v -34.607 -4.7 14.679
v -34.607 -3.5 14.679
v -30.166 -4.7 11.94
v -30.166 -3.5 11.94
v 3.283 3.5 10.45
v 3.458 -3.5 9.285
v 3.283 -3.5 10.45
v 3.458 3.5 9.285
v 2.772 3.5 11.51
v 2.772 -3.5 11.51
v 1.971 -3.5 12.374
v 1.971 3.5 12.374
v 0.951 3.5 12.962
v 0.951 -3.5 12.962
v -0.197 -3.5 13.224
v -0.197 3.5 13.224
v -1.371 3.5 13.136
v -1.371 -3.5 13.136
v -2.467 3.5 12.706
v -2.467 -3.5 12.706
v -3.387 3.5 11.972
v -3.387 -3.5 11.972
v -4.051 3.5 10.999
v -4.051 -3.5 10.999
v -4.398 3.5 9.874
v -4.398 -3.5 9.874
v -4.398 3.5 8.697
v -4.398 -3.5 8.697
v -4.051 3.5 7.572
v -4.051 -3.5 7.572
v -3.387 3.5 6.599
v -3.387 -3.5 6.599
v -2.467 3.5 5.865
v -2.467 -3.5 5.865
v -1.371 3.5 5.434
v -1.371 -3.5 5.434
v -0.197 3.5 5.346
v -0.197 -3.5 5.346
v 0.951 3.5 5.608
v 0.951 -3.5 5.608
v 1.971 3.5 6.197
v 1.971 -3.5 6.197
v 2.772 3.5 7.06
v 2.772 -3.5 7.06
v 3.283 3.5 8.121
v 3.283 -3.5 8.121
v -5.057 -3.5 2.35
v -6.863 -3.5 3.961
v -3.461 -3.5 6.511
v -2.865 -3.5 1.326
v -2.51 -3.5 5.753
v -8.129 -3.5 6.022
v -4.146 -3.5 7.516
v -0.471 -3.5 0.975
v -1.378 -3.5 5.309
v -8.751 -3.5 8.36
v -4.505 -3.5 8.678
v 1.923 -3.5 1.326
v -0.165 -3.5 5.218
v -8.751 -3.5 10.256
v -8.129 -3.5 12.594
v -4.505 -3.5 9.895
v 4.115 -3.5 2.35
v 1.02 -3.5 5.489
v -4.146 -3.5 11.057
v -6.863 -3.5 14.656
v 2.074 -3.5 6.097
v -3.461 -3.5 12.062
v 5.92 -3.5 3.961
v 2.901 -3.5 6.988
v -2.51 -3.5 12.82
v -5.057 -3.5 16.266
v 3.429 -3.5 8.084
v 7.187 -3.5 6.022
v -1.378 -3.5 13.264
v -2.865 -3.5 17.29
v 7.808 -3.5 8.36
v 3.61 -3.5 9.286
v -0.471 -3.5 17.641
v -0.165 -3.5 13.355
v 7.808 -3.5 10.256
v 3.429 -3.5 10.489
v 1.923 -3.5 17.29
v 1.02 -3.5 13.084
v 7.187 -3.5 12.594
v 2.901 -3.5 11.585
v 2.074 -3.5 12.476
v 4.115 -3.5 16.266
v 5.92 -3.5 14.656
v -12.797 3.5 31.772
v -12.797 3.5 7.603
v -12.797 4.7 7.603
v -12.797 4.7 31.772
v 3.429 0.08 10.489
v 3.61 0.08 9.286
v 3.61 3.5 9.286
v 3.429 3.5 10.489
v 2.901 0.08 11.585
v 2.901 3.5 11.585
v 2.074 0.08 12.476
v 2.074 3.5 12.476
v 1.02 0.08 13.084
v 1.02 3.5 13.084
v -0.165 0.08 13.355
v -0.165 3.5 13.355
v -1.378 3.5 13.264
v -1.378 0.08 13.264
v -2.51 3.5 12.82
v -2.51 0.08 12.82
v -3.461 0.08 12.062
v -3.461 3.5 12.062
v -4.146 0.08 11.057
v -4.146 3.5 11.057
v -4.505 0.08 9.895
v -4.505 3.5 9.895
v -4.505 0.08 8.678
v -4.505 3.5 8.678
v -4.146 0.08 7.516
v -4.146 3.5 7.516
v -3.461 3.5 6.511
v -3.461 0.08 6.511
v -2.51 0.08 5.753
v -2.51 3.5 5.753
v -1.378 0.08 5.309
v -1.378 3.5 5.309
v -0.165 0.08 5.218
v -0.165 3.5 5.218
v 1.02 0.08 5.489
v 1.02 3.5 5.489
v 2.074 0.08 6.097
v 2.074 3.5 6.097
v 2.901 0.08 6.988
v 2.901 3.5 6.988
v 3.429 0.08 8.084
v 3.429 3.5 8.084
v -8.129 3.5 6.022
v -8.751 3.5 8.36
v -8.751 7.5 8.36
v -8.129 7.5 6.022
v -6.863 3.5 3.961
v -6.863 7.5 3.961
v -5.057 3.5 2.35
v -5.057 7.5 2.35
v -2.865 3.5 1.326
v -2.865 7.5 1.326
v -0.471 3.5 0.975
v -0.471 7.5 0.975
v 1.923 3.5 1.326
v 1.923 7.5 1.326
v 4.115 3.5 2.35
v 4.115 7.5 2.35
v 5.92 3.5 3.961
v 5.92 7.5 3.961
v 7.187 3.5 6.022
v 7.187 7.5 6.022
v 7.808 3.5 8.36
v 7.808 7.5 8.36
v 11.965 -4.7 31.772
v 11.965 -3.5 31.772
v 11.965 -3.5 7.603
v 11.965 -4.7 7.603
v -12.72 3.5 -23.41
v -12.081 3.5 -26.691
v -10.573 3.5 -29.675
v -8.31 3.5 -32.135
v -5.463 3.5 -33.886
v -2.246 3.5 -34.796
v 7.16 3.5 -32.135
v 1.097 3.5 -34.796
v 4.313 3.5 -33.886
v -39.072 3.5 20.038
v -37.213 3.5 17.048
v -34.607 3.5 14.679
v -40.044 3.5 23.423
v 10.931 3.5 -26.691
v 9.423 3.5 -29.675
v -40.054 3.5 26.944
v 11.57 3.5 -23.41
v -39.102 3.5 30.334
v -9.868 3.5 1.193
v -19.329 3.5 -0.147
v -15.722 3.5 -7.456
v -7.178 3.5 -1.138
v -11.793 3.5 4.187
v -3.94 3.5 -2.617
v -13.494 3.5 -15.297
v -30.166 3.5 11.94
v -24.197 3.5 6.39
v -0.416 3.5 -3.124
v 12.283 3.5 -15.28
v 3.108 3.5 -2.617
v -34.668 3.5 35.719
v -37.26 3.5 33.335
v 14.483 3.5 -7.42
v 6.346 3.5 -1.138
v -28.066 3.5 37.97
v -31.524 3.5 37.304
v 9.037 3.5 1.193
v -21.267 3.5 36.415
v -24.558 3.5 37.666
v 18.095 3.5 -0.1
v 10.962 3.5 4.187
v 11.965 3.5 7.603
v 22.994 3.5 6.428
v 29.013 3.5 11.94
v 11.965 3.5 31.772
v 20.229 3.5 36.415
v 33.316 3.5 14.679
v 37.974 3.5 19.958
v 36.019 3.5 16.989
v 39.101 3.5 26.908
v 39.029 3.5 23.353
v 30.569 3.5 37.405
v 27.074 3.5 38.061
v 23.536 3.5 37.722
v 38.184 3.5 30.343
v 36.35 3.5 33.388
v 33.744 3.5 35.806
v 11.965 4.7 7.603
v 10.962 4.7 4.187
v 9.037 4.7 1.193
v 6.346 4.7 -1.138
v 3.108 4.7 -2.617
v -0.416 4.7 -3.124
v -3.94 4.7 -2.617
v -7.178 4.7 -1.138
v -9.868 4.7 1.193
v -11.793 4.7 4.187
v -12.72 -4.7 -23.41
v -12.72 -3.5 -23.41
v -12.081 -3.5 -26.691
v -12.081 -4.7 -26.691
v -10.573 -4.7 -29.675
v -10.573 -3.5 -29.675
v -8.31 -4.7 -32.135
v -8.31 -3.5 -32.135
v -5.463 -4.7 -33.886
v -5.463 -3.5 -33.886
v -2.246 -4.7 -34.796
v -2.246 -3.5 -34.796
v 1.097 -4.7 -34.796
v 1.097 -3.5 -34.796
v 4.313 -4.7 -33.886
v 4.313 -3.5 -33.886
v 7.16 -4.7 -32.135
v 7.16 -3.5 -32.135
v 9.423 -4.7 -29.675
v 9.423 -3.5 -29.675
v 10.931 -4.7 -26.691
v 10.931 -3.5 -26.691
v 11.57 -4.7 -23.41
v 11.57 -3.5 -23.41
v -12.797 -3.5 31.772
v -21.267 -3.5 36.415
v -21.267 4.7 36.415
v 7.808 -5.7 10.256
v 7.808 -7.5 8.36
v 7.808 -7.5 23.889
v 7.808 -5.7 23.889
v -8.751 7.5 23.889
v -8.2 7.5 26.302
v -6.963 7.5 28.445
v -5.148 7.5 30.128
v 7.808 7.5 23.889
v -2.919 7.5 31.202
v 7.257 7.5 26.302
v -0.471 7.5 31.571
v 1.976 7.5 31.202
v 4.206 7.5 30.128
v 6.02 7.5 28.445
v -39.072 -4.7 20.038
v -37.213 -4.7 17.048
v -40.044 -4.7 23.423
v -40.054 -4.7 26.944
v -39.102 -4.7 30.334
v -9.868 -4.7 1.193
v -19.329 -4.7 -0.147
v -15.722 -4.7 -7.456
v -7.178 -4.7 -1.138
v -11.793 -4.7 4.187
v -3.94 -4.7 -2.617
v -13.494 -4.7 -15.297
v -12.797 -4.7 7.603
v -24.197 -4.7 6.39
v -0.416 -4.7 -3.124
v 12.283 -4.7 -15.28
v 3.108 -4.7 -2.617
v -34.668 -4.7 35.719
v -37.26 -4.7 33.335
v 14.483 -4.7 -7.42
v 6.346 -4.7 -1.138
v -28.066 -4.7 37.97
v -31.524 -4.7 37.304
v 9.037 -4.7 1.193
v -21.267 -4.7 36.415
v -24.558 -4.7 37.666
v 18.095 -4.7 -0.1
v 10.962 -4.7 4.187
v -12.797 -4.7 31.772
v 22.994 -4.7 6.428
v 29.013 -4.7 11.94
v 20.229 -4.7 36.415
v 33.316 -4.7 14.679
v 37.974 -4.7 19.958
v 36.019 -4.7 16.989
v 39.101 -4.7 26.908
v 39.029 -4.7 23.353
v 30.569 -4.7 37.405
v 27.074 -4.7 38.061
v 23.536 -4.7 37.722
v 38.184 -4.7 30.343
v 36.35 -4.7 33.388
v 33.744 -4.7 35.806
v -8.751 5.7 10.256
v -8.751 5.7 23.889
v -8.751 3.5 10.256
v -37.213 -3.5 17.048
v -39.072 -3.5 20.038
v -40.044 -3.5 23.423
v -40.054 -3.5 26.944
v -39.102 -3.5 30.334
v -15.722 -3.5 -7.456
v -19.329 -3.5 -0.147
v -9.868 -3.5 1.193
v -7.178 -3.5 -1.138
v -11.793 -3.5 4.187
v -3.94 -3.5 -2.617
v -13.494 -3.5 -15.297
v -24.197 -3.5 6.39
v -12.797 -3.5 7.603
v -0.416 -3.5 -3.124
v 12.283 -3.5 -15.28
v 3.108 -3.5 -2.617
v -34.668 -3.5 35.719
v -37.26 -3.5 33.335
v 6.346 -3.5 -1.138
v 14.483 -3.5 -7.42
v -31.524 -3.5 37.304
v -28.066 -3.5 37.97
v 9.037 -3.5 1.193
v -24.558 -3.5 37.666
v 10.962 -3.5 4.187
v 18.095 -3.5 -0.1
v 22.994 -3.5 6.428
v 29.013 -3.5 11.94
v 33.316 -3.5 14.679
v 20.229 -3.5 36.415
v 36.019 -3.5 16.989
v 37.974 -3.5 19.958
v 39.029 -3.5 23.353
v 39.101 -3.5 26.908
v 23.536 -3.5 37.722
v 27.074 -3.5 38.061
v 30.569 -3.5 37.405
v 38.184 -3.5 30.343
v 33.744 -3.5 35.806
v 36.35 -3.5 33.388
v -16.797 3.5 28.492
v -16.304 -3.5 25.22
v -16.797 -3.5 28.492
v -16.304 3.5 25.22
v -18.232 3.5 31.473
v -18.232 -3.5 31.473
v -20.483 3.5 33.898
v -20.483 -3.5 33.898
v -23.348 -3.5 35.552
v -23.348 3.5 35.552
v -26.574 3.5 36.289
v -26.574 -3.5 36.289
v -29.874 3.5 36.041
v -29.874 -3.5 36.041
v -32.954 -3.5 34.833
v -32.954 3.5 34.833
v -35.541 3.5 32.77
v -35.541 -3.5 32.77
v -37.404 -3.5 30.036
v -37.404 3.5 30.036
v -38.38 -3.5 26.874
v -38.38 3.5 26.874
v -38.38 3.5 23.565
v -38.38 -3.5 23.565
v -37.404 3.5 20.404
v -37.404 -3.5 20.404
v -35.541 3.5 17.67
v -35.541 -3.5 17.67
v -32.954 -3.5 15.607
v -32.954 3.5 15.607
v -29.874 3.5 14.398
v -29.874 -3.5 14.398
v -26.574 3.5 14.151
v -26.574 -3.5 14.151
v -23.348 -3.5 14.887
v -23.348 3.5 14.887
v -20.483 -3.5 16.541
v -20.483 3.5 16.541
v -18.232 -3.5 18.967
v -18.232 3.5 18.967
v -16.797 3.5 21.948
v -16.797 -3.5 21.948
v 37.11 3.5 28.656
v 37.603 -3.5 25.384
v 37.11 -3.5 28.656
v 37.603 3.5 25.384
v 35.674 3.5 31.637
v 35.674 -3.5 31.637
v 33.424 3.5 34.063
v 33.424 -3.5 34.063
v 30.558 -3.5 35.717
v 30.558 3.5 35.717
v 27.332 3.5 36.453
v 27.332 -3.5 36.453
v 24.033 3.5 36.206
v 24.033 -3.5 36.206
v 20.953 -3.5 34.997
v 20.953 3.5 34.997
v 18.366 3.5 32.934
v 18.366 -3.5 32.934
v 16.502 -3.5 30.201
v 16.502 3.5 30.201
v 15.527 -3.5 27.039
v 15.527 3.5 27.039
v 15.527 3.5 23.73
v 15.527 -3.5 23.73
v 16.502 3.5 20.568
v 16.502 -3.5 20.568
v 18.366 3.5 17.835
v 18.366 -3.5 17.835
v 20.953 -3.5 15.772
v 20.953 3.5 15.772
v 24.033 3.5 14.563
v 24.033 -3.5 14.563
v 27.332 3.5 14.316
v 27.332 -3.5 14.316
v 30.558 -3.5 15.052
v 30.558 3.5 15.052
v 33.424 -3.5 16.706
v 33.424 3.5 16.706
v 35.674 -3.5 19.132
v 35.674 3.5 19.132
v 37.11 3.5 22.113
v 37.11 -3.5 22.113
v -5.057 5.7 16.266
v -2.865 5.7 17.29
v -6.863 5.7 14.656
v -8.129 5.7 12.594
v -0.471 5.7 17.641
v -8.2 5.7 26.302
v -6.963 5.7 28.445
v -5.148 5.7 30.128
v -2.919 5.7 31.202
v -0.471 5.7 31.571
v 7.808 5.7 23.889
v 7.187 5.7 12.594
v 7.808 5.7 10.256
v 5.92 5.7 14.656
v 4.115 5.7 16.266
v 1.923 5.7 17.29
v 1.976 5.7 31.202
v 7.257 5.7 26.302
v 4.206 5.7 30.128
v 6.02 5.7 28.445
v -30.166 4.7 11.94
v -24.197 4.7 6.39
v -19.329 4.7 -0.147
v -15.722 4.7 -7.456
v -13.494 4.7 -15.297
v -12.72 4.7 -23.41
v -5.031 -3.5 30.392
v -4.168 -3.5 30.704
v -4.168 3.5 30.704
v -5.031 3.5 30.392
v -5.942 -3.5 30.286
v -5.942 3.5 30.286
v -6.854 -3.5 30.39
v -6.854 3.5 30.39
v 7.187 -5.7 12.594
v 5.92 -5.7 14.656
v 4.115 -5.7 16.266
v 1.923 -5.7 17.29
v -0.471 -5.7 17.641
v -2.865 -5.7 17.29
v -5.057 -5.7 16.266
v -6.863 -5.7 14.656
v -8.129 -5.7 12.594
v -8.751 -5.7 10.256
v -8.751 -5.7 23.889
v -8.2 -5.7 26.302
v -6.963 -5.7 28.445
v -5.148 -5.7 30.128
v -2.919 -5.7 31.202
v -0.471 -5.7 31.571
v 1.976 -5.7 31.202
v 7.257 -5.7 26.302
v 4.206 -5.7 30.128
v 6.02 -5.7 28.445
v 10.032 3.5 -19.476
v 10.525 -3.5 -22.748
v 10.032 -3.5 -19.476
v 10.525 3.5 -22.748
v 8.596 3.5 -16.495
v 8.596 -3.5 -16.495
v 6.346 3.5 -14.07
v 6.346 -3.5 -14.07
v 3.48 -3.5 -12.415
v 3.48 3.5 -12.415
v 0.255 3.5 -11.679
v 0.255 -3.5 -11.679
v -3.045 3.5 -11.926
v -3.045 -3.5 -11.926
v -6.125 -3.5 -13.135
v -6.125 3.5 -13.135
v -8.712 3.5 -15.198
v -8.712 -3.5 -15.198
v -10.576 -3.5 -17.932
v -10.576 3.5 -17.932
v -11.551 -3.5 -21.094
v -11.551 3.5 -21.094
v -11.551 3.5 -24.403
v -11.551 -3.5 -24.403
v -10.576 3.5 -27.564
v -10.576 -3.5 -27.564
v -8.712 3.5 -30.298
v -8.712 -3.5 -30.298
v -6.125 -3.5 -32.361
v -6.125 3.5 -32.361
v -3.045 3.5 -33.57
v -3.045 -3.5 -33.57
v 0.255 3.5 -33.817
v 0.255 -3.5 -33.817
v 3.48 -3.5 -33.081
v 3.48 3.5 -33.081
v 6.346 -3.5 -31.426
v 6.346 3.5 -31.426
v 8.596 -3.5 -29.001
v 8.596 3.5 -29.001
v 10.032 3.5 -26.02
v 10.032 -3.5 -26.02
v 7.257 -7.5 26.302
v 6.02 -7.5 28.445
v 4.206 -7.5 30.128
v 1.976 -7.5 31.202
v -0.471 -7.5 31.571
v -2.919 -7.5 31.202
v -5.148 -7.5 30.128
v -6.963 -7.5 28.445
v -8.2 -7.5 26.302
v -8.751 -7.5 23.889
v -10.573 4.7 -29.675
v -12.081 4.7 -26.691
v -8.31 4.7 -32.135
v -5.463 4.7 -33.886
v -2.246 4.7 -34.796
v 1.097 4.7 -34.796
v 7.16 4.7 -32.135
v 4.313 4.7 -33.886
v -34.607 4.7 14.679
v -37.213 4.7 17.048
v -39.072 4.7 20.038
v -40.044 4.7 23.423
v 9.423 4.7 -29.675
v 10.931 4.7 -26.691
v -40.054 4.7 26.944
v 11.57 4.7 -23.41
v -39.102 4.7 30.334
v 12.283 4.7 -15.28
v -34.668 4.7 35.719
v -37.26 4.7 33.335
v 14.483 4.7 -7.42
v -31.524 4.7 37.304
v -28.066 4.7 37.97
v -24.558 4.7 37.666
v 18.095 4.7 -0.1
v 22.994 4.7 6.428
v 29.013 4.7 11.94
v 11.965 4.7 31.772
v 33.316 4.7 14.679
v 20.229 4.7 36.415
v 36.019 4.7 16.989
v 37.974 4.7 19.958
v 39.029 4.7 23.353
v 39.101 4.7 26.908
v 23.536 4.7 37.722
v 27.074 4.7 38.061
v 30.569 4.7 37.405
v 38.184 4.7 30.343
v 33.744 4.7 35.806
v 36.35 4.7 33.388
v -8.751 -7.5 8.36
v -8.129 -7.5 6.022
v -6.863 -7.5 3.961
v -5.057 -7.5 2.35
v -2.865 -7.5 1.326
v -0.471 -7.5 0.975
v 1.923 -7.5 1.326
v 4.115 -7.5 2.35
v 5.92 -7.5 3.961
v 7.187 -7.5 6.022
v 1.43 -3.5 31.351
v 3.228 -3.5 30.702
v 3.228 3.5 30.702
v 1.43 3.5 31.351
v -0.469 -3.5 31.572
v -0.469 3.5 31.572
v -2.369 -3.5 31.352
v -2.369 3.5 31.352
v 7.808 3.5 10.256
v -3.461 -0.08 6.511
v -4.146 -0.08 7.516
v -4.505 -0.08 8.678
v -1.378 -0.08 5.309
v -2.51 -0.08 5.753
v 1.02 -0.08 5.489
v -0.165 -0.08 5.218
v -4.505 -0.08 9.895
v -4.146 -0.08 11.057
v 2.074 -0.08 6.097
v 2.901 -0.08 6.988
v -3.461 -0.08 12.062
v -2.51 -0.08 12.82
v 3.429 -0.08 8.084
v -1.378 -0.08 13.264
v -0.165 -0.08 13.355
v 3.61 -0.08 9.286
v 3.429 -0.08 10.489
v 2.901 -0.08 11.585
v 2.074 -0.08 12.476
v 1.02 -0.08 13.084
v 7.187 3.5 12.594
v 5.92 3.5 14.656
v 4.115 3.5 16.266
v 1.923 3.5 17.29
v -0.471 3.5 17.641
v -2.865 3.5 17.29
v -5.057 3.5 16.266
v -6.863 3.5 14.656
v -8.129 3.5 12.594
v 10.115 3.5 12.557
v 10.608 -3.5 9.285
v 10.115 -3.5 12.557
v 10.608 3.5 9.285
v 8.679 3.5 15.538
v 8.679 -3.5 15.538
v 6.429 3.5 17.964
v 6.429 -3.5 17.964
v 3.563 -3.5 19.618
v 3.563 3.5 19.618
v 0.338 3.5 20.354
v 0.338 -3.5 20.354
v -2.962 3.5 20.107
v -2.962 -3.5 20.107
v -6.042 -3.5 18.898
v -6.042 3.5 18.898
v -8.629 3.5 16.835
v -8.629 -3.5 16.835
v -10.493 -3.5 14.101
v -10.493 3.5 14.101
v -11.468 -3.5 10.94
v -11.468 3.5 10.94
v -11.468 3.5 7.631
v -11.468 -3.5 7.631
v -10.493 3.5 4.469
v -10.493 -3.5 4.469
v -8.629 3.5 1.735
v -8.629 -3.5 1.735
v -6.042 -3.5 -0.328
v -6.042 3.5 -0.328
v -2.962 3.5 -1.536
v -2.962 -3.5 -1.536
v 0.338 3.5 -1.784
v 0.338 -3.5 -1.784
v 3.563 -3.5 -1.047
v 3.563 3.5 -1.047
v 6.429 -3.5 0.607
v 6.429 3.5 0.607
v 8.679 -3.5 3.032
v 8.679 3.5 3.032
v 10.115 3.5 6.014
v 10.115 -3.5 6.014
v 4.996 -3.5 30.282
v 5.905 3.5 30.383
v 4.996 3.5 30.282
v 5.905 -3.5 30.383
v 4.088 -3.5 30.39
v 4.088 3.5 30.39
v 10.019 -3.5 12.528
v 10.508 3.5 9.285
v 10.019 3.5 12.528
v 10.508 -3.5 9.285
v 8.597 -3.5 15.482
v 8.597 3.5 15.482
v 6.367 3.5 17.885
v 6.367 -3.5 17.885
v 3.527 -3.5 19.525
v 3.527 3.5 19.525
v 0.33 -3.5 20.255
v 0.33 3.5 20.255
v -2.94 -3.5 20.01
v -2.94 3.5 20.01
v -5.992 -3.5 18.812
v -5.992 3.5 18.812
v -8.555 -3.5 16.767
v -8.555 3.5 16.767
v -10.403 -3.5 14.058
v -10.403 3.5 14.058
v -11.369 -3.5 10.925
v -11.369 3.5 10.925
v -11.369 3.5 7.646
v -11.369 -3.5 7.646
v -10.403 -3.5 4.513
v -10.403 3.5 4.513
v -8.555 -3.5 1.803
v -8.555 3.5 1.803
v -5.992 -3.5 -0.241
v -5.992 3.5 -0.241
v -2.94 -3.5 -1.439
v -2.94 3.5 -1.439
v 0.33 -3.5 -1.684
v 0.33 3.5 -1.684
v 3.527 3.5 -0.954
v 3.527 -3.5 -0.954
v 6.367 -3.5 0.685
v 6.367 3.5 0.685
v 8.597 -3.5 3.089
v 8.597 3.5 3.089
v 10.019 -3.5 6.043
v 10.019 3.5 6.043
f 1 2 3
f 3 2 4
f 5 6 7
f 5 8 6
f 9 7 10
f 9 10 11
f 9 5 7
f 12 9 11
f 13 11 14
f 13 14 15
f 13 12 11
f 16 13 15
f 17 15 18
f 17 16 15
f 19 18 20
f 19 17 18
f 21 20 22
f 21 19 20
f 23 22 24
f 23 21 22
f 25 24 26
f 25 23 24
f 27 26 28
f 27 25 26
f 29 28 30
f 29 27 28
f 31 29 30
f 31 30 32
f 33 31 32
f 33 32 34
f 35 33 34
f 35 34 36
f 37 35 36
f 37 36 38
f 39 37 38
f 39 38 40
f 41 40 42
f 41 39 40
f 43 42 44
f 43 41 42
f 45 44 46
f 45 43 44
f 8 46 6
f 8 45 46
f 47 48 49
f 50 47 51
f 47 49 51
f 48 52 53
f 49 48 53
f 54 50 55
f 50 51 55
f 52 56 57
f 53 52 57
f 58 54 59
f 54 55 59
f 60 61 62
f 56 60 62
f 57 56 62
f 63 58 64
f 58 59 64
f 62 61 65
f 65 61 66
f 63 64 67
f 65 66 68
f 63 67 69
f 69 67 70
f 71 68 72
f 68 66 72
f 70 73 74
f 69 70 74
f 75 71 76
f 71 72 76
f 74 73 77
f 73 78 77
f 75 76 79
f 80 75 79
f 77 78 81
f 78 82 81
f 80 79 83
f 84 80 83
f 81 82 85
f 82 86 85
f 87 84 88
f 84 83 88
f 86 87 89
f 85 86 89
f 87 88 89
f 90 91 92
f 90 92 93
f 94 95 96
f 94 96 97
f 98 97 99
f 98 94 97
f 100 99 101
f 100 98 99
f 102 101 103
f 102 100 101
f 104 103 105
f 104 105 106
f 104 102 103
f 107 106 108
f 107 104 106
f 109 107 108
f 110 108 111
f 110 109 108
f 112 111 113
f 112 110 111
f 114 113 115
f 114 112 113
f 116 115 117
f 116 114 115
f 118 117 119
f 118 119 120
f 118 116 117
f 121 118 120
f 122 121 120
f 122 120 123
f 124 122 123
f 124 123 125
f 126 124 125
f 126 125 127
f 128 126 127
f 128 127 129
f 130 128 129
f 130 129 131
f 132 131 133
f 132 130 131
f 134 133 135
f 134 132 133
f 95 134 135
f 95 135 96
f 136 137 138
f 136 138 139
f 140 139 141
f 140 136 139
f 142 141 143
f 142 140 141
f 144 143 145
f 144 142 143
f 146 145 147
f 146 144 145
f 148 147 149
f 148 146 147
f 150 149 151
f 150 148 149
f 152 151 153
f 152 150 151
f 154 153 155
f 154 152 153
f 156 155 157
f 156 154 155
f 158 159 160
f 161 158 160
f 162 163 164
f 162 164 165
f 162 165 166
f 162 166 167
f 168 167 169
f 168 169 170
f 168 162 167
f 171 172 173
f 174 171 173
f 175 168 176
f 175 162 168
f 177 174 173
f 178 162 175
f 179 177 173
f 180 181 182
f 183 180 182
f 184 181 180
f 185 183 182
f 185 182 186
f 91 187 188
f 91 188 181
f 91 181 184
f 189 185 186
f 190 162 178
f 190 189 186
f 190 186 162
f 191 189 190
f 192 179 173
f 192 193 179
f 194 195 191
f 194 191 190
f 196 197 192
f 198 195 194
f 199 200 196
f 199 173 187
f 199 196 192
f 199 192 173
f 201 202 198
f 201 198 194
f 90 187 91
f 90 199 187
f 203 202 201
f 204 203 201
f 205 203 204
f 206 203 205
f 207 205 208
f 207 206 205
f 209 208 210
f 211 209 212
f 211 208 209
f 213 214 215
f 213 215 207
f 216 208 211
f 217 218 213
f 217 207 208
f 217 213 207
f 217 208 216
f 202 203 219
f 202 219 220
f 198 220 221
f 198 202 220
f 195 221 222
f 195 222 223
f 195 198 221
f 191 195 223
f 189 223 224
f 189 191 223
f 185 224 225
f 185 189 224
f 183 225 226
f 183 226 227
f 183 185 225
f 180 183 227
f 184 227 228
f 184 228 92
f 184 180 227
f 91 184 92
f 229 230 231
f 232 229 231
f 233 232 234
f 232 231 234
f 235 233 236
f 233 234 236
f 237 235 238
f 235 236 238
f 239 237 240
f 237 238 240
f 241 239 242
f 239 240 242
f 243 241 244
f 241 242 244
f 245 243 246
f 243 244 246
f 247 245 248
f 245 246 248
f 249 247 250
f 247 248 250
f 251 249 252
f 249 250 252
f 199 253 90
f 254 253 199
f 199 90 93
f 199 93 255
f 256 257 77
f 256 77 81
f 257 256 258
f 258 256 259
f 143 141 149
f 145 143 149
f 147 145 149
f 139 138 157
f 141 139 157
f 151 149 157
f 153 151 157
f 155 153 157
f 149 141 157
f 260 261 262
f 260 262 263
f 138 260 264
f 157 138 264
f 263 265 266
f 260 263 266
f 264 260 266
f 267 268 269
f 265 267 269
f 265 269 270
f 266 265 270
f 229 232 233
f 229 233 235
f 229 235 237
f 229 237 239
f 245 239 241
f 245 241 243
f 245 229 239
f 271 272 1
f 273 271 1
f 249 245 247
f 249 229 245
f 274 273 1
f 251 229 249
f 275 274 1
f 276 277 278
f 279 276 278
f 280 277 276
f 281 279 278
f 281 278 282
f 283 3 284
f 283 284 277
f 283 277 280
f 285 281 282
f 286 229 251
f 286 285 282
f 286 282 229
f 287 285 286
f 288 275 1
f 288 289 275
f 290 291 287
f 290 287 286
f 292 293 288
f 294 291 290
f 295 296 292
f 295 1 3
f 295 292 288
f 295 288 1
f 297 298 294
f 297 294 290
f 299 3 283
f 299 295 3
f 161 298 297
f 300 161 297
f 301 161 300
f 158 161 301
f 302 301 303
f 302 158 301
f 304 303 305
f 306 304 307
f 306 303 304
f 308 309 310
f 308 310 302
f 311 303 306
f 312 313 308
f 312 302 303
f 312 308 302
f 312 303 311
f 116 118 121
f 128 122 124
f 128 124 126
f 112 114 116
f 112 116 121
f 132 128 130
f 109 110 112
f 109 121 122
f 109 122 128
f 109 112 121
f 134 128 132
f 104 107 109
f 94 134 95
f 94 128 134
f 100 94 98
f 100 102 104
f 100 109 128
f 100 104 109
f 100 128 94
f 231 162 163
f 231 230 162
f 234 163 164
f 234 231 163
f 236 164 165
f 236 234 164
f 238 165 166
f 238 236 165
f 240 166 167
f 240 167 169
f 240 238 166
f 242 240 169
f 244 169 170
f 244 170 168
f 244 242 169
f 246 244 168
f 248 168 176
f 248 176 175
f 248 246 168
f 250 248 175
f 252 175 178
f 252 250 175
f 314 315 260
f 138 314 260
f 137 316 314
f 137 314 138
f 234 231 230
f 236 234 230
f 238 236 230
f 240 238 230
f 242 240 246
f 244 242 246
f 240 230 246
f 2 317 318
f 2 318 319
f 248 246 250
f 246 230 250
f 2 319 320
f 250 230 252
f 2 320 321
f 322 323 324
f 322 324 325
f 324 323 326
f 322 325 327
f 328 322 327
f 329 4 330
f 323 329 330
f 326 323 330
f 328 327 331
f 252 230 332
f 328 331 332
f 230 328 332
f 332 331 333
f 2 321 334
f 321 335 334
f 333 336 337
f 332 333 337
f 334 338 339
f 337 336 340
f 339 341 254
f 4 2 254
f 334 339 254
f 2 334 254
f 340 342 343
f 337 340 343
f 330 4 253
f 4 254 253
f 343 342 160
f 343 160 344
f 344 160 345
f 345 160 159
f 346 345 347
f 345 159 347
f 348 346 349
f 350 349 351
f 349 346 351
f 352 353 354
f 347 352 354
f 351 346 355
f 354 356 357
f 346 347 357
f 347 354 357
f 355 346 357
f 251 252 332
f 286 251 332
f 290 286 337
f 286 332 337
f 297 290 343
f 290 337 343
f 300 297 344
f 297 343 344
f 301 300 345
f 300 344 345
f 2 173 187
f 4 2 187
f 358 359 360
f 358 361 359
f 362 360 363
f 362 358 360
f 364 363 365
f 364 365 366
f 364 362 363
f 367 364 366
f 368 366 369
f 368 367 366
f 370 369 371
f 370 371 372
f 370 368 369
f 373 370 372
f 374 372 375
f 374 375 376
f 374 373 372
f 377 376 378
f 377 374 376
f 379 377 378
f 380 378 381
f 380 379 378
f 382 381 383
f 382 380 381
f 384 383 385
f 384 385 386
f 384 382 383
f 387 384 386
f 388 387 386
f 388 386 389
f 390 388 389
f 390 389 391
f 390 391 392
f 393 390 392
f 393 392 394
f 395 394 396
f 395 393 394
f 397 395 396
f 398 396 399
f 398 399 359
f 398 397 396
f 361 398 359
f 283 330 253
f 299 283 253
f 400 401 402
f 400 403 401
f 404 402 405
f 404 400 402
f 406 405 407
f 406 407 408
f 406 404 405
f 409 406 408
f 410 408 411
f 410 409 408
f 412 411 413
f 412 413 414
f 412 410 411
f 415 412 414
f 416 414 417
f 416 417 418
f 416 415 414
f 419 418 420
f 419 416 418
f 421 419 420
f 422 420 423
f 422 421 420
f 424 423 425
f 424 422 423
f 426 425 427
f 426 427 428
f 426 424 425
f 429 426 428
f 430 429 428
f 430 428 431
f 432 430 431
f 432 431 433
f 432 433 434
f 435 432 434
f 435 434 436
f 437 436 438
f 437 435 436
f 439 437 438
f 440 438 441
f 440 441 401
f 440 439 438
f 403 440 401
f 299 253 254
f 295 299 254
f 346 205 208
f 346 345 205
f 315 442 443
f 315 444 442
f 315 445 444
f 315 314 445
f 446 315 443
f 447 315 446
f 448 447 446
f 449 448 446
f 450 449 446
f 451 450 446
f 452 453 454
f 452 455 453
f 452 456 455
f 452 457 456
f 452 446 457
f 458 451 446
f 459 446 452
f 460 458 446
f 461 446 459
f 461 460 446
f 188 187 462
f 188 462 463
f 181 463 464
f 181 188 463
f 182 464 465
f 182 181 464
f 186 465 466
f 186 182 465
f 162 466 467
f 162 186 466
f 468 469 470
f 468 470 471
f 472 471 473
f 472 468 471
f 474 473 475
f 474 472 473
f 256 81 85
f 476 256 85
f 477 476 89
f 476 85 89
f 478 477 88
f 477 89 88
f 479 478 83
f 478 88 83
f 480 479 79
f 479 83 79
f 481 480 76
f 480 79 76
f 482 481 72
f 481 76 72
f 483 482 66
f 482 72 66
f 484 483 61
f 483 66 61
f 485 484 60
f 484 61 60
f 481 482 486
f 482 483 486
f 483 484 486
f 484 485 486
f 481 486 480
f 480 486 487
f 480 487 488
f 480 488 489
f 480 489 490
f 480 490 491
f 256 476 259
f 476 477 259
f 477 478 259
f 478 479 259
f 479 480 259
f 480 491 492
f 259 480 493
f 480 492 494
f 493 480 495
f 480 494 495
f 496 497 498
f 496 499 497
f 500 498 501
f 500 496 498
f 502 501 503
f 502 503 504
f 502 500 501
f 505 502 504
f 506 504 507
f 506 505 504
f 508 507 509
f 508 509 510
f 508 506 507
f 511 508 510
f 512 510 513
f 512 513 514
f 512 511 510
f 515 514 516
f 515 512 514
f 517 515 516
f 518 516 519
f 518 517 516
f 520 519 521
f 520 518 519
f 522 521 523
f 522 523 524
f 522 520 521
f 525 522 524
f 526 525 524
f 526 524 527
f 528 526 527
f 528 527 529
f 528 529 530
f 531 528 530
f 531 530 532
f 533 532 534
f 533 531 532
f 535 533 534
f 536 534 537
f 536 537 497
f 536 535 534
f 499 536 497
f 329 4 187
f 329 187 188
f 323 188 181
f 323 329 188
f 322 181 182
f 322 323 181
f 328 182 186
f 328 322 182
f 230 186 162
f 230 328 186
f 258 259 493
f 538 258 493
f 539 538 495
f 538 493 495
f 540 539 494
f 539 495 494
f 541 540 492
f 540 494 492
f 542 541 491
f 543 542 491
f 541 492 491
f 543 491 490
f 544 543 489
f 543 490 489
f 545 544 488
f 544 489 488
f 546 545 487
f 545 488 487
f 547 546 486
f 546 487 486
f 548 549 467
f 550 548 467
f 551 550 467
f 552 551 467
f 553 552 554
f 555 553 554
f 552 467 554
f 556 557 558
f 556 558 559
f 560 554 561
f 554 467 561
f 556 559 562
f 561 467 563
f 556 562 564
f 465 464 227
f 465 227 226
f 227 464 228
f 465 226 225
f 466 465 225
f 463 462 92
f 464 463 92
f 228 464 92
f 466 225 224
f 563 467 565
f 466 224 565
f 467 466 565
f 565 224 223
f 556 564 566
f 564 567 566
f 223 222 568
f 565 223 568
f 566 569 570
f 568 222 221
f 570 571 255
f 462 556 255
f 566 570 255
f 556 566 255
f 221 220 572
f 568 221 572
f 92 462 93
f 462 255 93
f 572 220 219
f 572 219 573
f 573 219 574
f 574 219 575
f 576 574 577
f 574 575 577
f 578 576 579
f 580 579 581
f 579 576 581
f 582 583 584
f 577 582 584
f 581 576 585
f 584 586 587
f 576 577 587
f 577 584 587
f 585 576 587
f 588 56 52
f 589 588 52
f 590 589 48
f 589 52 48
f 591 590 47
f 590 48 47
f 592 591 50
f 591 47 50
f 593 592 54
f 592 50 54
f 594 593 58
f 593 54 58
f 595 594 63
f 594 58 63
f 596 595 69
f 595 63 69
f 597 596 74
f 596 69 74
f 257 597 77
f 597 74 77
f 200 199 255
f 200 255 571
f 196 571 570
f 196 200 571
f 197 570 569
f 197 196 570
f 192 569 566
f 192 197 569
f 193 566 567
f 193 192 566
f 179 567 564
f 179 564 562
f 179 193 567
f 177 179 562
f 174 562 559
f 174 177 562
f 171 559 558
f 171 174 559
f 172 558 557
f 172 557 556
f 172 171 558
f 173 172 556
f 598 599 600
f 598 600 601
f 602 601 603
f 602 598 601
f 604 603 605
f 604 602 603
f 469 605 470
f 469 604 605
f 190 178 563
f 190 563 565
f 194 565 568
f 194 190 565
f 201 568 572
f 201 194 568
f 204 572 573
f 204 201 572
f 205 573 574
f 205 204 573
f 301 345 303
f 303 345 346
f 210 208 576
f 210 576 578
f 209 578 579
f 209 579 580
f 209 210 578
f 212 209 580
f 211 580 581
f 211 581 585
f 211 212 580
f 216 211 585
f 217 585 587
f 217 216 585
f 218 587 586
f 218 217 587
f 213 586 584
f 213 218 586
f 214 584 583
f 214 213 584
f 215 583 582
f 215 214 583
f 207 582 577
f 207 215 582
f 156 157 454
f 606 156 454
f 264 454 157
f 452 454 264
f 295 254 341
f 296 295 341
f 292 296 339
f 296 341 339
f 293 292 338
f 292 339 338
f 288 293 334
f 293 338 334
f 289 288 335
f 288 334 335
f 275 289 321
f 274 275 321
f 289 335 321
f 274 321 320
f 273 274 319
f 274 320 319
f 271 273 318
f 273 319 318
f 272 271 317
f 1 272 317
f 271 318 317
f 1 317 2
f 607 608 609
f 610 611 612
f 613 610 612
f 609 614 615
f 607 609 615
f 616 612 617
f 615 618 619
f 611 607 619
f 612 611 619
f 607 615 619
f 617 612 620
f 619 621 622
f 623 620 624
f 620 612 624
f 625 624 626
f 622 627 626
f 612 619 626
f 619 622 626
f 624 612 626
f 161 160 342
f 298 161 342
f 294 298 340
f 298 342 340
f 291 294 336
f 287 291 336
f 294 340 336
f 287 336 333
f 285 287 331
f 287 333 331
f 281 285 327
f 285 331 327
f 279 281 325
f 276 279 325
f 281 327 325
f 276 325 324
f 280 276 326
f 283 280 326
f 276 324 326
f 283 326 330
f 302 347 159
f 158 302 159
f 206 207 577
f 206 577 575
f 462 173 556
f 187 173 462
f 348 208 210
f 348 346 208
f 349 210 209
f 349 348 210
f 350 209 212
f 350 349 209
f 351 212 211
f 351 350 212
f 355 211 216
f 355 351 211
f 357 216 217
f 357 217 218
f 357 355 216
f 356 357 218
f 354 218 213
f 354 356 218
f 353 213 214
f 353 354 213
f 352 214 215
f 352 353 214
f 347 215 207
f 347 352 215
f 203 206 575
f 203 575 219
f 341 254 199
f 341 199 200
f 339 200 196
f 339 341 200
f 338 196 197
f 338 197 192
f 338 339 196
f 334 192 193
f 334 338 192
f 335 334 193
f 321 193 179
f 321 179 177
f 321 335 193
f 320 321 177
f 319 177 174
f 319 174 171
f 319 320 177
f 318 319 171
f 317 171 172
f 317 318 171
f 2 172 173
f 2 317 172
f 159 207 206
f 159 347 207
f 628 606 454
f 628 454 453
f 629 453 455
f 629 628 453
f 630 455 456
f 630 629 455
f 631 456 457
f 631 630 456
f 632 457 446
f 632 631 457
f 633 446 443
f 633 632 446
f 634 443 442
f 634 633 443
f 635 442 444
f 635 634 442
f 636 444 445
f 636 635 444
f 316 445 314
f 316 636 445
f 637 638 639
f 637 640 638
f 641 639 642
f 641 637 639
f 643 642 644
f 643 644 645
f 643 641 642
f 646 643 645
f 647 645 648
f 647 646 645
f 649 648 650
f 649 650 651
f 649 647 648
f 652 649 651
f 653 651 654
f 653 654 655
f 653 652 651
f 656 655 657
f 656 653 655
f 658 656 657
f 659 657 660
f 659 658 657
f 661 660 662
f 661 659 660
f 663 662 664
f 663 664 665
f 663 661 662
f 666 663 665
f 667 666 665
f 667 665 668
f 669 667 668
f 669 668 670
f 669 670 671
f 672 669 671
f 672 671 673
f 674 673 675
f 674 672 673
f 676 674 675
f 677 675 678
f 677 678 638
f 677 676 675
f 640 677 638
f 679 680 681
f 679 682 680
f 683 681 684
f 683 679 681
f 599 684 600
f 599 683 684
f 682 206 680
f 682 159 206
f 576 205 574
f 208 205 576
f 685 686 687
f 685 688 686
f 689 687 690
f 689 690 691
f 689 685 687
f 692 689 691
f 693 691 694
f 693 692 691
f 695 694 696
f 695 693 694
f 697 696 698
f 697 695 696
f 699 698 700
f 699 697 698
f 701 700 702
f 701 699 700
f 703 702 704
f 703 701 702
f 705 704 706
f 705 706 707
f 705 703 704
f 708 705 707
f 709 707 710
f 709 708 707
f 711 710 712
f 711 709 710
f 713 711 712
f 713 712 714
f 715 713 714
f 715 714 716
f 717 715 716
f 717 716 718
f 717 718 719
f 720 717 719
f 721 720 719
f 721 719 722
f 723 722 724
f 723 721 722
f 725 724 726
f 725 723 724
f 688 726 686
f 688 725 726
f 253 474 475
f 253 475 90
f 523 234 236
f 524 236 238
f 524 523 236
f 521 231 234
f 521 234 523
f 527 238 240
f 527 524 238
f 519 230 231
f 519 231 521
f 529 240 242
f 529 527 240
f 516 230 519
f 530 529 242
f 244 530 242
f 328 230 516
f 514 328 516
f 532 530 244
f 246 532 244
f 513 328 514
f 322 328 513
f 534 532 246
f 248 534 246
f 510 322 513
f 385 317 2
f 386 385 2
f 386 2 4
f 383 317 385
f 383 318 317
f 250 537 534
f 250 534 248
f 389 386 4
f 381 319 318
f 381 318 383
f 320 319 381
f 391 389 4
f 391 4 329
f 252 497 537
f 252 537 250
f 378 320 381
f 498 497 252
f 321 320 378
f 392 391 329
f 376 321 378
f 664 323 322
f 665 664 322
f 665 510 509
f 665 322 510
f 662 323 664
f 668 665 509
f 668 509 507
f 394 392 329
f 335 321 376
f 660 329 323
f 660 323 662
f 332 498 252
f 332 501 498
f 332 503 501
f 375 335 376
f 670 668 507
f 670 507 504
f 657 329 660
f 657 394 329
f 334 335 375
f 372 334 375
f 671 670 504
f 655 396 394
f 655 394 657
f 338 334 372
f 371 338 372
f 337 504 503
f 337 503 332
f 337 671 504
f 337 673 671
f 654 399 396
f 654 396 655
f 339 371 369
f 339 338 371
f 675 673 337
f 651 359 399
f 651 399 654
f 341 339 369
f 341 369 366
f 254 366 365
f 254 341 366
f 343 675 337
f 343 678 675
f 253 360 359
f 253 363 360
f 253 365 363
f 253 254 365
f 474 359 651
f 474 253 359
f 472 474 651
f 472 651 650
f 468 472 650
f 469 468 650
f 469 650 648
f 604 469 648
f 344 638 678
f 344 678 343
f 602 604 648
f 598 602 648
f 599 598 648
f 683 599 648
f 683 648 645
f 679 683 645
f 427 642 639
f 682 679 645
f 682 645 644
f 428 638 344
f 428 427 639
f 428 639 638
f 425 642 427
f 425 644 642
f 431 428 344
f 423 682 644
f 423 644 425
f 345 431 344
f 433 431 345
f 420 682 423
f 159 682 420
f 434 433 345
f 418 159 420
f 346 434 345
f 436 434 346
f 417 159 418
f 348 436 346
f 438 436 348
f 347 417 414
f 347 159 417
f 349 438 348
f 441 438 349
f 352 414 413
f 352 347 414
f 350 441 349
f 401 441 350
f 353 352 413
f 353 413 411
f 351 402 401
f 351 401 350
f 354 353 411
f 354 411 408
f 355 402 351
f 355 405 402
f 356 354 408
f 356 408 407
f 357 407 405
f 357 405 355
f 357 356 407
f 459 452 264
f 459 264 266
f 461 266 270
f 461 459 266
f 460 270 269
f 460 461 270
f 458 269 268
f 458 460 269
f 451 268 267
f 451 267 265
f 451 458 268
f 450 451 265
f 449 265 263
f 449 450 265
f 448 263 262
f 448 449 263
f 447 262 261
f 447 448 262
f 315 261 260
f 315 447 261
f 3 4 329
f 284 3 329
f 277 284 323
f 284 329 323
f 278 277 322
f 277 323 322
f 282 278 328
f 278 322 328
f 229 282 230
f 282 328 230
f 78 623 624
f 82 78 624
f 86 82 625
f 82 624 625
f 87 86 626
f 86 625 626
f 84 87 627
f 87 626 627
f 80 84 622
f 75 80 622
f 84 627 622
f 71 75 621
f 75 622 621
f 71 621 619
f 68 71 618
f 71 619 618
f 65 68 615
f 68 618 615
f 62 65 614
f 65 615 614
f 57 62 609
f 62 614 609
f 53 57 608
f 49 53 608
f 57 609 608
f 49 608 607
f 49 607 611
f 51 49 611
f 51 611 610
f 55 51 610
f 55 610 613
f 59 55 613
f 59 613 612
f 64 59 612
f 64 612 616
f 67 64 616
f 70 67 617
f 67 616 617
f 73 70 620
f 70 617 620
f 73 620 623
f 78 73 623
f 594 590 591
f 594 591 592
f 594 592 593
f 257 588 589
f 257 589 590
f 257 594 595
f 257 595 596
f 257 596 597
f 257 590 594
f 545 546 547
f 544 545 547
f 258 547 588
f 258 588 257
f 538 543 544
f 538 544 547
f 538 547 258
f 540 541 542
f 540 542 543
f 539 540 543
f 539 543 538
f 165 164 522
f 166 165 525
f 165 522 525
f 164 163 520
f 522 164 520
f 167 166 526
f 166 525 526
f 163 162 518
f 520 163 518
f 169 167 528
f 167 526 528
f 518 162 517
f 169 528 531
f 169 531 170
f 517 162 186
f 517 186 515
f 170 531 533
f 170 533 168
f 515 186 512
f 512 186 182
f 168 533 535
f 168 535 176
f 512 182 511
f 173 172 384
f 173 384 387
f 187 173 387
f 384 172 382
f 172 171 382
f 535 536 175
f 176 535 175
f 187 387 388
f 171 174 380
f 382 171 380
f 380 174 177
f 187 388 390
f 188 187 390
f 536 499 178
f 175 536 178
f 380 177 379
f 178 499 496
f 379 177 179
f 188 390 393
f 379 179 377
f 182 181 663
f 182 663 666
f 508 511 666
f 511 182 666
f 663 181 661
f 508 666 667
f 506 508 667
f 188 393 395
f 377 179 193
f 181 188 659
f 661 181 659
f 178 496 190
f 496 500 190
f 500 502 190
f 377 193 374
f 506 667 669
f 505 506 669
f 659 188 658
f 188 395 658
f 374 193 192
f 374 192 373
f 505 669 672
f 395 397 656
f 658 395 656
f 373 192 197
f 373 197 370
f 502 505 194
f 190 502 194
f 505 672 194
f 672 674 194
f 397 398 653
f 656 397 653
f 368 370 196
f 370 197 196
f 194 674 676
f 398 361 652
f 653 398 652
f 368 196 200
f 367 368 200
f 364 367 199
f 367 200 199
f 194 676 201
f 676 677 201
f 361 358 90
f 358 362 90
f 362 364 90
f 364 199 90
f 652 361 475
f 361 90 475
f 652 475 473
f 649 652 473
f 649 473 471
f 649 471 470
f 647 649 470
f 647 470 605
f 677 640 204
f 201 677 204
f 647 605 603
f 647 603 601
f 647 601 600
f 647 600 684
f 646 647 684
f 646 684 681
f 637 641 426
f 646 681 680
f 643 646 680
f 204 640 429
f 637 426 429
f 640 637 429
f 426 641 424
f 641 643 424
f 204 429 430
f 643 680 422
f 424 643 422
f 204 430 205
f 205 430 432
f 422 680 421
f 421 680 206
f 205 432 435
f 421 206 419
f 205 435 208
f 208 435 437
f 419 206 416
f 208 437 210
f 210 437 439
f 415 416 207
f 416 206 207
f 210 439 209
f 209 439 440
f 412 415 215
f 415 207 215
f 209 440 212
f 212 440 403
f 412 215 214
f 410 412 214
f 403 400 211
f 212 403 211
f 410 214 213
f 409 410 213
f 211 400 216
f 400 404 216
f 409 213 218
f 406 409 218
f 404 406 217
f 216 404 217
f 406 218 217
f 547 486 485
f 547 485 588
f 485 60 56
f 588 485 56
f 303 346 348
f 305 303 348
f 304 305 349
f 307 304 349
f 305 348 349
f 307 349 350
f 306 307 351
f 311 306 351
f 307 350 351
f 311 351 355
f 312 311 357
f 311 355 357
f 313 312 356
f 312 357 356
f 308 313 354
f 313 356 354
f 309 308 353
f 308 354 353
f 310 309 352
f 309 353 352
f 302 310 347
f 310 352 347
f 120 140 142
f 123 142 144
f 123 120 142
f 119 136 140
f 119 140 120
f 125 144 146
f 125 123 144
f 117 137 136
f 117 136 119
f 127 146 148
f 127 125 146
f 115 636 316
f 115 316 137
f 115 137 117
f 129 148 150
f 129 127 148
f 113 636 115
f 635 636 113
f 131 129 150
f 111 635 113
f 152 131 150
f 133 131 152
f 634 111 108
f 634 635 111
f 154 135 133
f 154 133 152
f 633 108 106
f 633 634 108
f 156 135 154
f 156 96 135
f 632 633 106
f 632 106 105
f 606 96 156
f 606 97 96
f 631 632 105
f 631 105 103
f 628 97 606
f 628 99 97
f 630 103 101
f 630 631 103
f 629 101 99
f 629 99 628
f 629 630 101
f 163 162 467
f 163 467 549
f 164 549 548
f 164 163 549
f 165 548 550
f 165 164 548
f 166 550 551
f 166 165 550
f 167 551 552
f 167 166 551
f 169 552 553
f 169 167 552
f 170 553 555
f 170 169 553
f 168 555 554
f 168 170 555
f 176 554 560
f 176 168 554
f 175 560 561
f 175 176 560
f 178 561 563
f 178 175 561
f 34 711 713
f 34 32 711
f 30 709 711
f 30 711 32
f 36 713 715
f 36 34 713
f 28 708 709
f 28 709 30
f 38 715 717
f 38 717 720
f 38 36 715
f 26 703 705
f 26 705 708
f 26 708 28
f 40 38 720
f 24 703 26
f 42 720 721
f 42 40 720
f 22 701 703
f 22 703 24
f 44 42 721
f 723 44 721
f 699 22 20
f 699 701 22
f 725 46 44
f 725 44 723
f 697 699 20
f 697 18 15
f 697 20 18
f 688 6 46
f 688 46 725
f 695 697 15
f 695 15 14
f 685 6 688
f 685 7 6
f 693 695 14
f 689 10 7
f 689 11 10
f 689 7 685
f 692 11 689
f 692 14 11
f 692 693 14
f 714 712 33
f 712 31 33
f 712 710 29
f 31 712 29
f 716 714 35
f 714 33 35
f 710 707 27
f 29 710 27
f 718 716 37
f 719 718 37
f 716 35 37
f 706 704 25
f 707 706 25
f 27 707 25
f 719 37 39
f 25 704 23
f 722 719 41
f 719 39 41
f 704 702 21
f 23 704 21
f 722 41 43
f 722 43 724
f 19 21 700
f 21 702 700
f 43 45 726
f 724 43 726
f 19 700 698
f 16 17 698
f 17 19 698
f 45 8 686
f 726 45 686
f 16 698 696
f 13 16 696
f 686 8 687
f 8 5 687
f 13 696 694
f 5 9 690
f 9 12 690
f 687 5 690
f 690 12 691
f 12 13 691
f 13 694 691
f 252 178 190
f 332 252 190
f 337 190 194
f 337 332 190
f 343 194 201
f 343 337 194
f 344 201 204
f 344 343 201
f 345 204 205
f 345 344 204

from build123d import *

# Parameters (mm, degrees)
F1_START  = 4.375
F1_DEPTH  = 1.5
F2_R      = 13.875
F3_DEPTH  = 4.375
F5_START  = -4.375
F5_DEPTH  = 1.5
F10_START = 7.125
F10_DEPTH = 2.25
F11_START = -5.5
F11_DEPTH = 2
F12_START = 4.375
F12_DEPTH = 2.75
F13_START = -3.5
F13_DEPTH = 2
F16_START = 0.1
F14_R     = 5.1
F16_DEPTH = 4.275
F17_START = -0.395
F15_R     = 4.14
F17_DEPTH = 3.105
F18_R     = 13.75
F18_R_2   = 4.9375
F19_DEPTH = 4.375
F20_SCALE = 0.8


# Not quite as in the source:
# - a feature names something its author has since deleted; it is built from what else it names


with BuildPart() as f1:
    # F0 (on Front) → F1 (new body)
    with BuildSketch(Plane.XZ.offset(F1_START)):
        with BuildLine():
            Line((25.2868216485, 45.5188639462), (14.9562442675, 39.715051651))
            Line((14.9562442675, 39.715051651), (14.9562442675, 9.5035806298))
            ThreePointArc((14.9562442675, 9.5035806298), (-0.5198442377, -3.9046924703), (-15.995932743, 9.5035806298))
            Line((-15.995932743, 9.5035806298), (-15.995932743, 39.715051651))
            Line((-15.995932743, 39.715051651), (-26.5831723809, 45.5188639462))
            ThreePointArc((-26.5831723809, 45.5188639462), (-47.8560530267, 39.8727264749), (-43.2591997087, 18.3487106115))
            Line((-43.2591997087, 18.3487106115), (-37.7070344985, 14.9252964184))
            ThreePointArc((-37.7070344985, 14.9252964184), (-21.6988985987, -4.6496789904), (-15.8998668194, -29.262913391))
            ThreePointArc((-15.8998668194, -29.262913391), (-0.7185637951, -43.6390577842), (14.4627392292, -29.262913391))
            ThreePointArc((14.4627392292, -29.262913391), (20.148592377, -4.5950626204), (36.2665131688, 14.9252964184))
            Line((36.2665131688, 14.9252964184), (41.6454896331, 18.3487106115))
            ThreePointArc((41.6454896331, 18.3487106115), (46.7179439882, 39.9124542781), (25.2868216485, 45.5188639462))
        make_face()
    extrude(amount=F1_DEPTH)


with BuildPart() as f3:
    # F2 (on Front) → F3 (new body, symmetric)
    with BuildSketch(Plane.XZ):
        with BuildLine():
            ThreePointArc((7.3808994443, 37.9791115091), (5.6737072201, 37.8877583952), (4.0355361424, 38.3768863971))
            ThreePointArc((4.0355361424, 38.3768863971), (-0.5865597778, 39.4647162659), (-5.209378452, 38.3799619045))
            ThreePointArc((-5.209378452, 38.3799619045), (-6.854306785, 37.8911677077), (-8.5676256765, 37.9873309216))
            Line((-8.5676256765, 37.9873309216), (-15.995932743, 39.715051651))
            Line((-15.995932743, 39.715051651), (-26.5831723809, 45.5188639462))
            ThreePointArc((-26.5831723809, 45.5188639462), (-47.8560530267, 39.8727264749), (-43.2591997087, 18.3487106115))
            Line((-43.2591997087, 18.3487106115), (-37.7070344985, 14.9252964184))
            ThreePointArc((-37.7070344985, 14.9252964184), (-21.6988985987, -4.6496789904), (-15.8998668194, -29.262913391))
            ThreePointArc((-15.8998668194, -29.262913391), (-0.7185637951, -43.6390577842), (14.4627392292, -29.262913391))
            ThreePointArc((14.4627392292, -29.262913391), (20.148592377, -4.5950626204), (36.2665131688, 14.9252964184))
            Line((36.2665131688, 14.9252964184), (41.6454896331, 18.3487106115))
            ThreePointArc((41.6454896331, 18.3487106115), (46.7179439882, 39.9124542781), (25.2868216485, 45.5188639462))
            Line((25.2868216485, 45.5188639462), (14.9562442675, 39.715051651))
            Line((14.9562442675, 39.715051651), (7.3808994443, 37.9791115091))
        make_face()
        with Locations((-0.7185637951, -28.4352076707)):
            Circle(F2_R, mode=Mode.SUBTRACT)
        with Locations((-0.6148405476, 11.6066905533)):
            Circle(F2_R, mode=Mode.SUBTRACT)
        with Locations((-34.2546339944, 31.5246824765)):
            Circle(F2_R, mode=Mode.SUBTRACT)
        with Locations((33.1286761467, 31.7305968542)):
            Circle(F2_R, mode=Mode.SUBTRACT)
    extrude(amount=F3_DEPTH, both=True)


with BuildPart() as f5:
    # F4 (on Front) → F5 (new body)
    with BuildSketch(Plane.XZ.offset(F5_START)):
        with BuildLine():
            Line((25.2868216485, 45.5188639462), (14.9562442675, 39.715051651))
            Line((14.9562442675, 39.715051651), (14.9562442675, 9.5035806298))
            ThreePointArc((14.9562442675, 9.5035806298), (-0.5198442377, -3.9046924703), (-15.995932743, 9.5035806298))
            Line((-15.995932743, 9.5035806298), (-15.995932743, 39.715051651))
            Line((-15.995932743, 39.715051651), (-26.5831723809, 45.5188639462))
            ThreePointArc((-26.5831723809, 45.5188639462), (-47.8560530267, 39.8727264749), (-43.2591997087, 18.3487106115))
            Line((-43.2591997087, 18.3487106115), (-37.7070344985, 14.9252964184))
            ThreePointArc((-37.7070344985, 14.9252964184), (-21.6988985987, -4.6496789904), (-15.8998668194, -29.262913391))
            ThreePointArc((-15.8998668194, -29.262913391), (-0.7185637951, -43.6390577842), (14.4627392292, -29.262913391))
            ThreePointArc((14.4627392292, -29.262913391), (20.148592377, -4.5950626204), (36.2665131688, 14.9252964184))
            Line((36.2665131688, 14.9252964184), (41.6454896331, 18.3487106115))
            ThreePointArc((41.6454896331, 18.3487106115), (46.7179439882, 39.9124542781), (25.2868216485, 45.5188639462))
        make_face()
    extrude(amount=-F5_DEPTH)


with BuildPart() as f10:
    # F6 (on Front) → F10 (new body)
    with BuildSketch(Plane.XZ.offset(F10_START)):
        with BuildLine():
            ThreePointArc((9.7599746659, 29.8606865108), (-0.589103438, 39.4640683192), (-10.9381815419, 29.8606865108))
            Line((-10.9381815419, 29.8606865108), (-10.9381815419, 10.4503789917))
            ThreePointArc((-10.9381815419, 10.4503789917), (-0.589103438, 1.2185059392), (9.7599746659, 10.4503789917))
            Line((9.7599746659, 10.4503789917), (9.7599746659, 29.8606865108))
        make_face()
    extrude(amount=F10_DEPTH)

    # F8 (on Front) → F12 (join)
    with BuildSketch(Plane.XZ.offset(F12_START)):
        with BuildLine():
            Line((9.7599746659, 10.4503789917), (9.7599746659, 12.819988866))
            ThreePointArc((9.7599746659, 12.819988866), (-0.589103438, 22.0518619185), (-10.9381815419, 12.819988866))
            Line((-10.9381815419, 12.819988866), (-10.9381815419, 10.4503789917))
            ThreePointArc((-10.9381815419, 10.4503789917), (-0.589103438, 1.2185059392), (9.7599746659, 10.4503789917))
        make_face()
    extrude(amount=F12_DEPTH)

    # F14 (on Front) → F16 (join)
    with BuildSketch(Plane.XZ.offset(F16_START)):
        with Locations((-0.5877316771, 11.6080907404)):
            Circle(F14_R)
    extrude(amount=F16_DEPTH)


with BuildPart() as f11:
    # F7 (on Front) → F11 (new body)
    with BuildSketch(Plane.XZ.offset(F11_START)):
        with BuildLine():
            ThreePointArc((9.7599746659, 29.8606865108), (-0.589103438, 39.4640683192), (-10.9381815419, 29.8606865108))
            Line((-10.9381815419, 29.8606865108), (-10.9381815419, 10.4503789917))
            ThreePointArc((-10.9381815419, 10.4503789917), (-0.589103438, 1.2185059392), (9.7599746659, 10.4503789917))
            Line((9.7599746659, 10.4503789917), (9.7599746659, 29.8606865108))
        make_face()
    extrude(amount=-F11_DEPTH)

    # F9 (on Front) → F13 (join)
    with BuildSketch(Plane.XZ.offset(F13_START)):
        with BuildLine():
            Line((9.7599746659, 10.4503789917), (9.7599746659, 12.819988866))
            ThreePointArc((9.7599746659, 12.819988866), (-0.589103438, 22.0518619185), (-10.9381815419, 12.819988866))
            Line((-10.9381815419, 12.819988866), (-10.9381815419, 10.4503789917))
            ThreePointArc((-10.9381815419, 10.4503789917), (-0.589103438, 1.2185059392), (9.7599746659, 10.4503789917))
        make_face()
    extrude(amount=-F13_DEPTH)

    # F15 (on Front) → F17 (join)
    with BuildSketch(Plane.XZ.offset(F17_START)):
        with Locations((-0.589103438, 11.6351839289)):
            Circle(F15_R)
    extrude(amount=-F17_DEPTH)


with BuildPart() as f19:
    # F18 (on Front) → F19 (new body, symmetric)
    with BuildSketch(Plane.XZ):
        with Locations((-0.6148405476, 11.6066905533)):
            Circle(F18_R)
        with Locations((-0.6148405476, 11.6066905533)):
            Circle(F18_R_2, mode=Mode.SUBTRACT)
    extrude(amount=F19_DEPTH, both=True)


with BuildPart() as f3_1:
    # F20: moved
    add(f3.part.scale(F20_SCALE))


with BuildPart() as f5_1:
    # F20: moved
    add(f5.part.scale(F20_SCALE))


with BuildPart() as f10_1:
    # F20: moved
    add(f10.part.scale(F20_SCALE))


with BuildPart() as f11_1:
    # F20: moved
    add(f11.part.scale(F20_SCALE))


with BuildPart() as f1_1:
    # F20: moved
    add(f1.part.scale(F20_SCALE))


with BuildPart() as f19_1:
    # F20: moved
    add(f19.part.scale(F20_SCALE))


with BuildPart() as f22_1:
    # F22: instance of F10
    add(f10_1.part.mirror(Plane.XZ))


solid = Compound([f3_1.part, f5_1.part, f10_1.part, f1_1.part, f19_1.part, f22_1.part])
